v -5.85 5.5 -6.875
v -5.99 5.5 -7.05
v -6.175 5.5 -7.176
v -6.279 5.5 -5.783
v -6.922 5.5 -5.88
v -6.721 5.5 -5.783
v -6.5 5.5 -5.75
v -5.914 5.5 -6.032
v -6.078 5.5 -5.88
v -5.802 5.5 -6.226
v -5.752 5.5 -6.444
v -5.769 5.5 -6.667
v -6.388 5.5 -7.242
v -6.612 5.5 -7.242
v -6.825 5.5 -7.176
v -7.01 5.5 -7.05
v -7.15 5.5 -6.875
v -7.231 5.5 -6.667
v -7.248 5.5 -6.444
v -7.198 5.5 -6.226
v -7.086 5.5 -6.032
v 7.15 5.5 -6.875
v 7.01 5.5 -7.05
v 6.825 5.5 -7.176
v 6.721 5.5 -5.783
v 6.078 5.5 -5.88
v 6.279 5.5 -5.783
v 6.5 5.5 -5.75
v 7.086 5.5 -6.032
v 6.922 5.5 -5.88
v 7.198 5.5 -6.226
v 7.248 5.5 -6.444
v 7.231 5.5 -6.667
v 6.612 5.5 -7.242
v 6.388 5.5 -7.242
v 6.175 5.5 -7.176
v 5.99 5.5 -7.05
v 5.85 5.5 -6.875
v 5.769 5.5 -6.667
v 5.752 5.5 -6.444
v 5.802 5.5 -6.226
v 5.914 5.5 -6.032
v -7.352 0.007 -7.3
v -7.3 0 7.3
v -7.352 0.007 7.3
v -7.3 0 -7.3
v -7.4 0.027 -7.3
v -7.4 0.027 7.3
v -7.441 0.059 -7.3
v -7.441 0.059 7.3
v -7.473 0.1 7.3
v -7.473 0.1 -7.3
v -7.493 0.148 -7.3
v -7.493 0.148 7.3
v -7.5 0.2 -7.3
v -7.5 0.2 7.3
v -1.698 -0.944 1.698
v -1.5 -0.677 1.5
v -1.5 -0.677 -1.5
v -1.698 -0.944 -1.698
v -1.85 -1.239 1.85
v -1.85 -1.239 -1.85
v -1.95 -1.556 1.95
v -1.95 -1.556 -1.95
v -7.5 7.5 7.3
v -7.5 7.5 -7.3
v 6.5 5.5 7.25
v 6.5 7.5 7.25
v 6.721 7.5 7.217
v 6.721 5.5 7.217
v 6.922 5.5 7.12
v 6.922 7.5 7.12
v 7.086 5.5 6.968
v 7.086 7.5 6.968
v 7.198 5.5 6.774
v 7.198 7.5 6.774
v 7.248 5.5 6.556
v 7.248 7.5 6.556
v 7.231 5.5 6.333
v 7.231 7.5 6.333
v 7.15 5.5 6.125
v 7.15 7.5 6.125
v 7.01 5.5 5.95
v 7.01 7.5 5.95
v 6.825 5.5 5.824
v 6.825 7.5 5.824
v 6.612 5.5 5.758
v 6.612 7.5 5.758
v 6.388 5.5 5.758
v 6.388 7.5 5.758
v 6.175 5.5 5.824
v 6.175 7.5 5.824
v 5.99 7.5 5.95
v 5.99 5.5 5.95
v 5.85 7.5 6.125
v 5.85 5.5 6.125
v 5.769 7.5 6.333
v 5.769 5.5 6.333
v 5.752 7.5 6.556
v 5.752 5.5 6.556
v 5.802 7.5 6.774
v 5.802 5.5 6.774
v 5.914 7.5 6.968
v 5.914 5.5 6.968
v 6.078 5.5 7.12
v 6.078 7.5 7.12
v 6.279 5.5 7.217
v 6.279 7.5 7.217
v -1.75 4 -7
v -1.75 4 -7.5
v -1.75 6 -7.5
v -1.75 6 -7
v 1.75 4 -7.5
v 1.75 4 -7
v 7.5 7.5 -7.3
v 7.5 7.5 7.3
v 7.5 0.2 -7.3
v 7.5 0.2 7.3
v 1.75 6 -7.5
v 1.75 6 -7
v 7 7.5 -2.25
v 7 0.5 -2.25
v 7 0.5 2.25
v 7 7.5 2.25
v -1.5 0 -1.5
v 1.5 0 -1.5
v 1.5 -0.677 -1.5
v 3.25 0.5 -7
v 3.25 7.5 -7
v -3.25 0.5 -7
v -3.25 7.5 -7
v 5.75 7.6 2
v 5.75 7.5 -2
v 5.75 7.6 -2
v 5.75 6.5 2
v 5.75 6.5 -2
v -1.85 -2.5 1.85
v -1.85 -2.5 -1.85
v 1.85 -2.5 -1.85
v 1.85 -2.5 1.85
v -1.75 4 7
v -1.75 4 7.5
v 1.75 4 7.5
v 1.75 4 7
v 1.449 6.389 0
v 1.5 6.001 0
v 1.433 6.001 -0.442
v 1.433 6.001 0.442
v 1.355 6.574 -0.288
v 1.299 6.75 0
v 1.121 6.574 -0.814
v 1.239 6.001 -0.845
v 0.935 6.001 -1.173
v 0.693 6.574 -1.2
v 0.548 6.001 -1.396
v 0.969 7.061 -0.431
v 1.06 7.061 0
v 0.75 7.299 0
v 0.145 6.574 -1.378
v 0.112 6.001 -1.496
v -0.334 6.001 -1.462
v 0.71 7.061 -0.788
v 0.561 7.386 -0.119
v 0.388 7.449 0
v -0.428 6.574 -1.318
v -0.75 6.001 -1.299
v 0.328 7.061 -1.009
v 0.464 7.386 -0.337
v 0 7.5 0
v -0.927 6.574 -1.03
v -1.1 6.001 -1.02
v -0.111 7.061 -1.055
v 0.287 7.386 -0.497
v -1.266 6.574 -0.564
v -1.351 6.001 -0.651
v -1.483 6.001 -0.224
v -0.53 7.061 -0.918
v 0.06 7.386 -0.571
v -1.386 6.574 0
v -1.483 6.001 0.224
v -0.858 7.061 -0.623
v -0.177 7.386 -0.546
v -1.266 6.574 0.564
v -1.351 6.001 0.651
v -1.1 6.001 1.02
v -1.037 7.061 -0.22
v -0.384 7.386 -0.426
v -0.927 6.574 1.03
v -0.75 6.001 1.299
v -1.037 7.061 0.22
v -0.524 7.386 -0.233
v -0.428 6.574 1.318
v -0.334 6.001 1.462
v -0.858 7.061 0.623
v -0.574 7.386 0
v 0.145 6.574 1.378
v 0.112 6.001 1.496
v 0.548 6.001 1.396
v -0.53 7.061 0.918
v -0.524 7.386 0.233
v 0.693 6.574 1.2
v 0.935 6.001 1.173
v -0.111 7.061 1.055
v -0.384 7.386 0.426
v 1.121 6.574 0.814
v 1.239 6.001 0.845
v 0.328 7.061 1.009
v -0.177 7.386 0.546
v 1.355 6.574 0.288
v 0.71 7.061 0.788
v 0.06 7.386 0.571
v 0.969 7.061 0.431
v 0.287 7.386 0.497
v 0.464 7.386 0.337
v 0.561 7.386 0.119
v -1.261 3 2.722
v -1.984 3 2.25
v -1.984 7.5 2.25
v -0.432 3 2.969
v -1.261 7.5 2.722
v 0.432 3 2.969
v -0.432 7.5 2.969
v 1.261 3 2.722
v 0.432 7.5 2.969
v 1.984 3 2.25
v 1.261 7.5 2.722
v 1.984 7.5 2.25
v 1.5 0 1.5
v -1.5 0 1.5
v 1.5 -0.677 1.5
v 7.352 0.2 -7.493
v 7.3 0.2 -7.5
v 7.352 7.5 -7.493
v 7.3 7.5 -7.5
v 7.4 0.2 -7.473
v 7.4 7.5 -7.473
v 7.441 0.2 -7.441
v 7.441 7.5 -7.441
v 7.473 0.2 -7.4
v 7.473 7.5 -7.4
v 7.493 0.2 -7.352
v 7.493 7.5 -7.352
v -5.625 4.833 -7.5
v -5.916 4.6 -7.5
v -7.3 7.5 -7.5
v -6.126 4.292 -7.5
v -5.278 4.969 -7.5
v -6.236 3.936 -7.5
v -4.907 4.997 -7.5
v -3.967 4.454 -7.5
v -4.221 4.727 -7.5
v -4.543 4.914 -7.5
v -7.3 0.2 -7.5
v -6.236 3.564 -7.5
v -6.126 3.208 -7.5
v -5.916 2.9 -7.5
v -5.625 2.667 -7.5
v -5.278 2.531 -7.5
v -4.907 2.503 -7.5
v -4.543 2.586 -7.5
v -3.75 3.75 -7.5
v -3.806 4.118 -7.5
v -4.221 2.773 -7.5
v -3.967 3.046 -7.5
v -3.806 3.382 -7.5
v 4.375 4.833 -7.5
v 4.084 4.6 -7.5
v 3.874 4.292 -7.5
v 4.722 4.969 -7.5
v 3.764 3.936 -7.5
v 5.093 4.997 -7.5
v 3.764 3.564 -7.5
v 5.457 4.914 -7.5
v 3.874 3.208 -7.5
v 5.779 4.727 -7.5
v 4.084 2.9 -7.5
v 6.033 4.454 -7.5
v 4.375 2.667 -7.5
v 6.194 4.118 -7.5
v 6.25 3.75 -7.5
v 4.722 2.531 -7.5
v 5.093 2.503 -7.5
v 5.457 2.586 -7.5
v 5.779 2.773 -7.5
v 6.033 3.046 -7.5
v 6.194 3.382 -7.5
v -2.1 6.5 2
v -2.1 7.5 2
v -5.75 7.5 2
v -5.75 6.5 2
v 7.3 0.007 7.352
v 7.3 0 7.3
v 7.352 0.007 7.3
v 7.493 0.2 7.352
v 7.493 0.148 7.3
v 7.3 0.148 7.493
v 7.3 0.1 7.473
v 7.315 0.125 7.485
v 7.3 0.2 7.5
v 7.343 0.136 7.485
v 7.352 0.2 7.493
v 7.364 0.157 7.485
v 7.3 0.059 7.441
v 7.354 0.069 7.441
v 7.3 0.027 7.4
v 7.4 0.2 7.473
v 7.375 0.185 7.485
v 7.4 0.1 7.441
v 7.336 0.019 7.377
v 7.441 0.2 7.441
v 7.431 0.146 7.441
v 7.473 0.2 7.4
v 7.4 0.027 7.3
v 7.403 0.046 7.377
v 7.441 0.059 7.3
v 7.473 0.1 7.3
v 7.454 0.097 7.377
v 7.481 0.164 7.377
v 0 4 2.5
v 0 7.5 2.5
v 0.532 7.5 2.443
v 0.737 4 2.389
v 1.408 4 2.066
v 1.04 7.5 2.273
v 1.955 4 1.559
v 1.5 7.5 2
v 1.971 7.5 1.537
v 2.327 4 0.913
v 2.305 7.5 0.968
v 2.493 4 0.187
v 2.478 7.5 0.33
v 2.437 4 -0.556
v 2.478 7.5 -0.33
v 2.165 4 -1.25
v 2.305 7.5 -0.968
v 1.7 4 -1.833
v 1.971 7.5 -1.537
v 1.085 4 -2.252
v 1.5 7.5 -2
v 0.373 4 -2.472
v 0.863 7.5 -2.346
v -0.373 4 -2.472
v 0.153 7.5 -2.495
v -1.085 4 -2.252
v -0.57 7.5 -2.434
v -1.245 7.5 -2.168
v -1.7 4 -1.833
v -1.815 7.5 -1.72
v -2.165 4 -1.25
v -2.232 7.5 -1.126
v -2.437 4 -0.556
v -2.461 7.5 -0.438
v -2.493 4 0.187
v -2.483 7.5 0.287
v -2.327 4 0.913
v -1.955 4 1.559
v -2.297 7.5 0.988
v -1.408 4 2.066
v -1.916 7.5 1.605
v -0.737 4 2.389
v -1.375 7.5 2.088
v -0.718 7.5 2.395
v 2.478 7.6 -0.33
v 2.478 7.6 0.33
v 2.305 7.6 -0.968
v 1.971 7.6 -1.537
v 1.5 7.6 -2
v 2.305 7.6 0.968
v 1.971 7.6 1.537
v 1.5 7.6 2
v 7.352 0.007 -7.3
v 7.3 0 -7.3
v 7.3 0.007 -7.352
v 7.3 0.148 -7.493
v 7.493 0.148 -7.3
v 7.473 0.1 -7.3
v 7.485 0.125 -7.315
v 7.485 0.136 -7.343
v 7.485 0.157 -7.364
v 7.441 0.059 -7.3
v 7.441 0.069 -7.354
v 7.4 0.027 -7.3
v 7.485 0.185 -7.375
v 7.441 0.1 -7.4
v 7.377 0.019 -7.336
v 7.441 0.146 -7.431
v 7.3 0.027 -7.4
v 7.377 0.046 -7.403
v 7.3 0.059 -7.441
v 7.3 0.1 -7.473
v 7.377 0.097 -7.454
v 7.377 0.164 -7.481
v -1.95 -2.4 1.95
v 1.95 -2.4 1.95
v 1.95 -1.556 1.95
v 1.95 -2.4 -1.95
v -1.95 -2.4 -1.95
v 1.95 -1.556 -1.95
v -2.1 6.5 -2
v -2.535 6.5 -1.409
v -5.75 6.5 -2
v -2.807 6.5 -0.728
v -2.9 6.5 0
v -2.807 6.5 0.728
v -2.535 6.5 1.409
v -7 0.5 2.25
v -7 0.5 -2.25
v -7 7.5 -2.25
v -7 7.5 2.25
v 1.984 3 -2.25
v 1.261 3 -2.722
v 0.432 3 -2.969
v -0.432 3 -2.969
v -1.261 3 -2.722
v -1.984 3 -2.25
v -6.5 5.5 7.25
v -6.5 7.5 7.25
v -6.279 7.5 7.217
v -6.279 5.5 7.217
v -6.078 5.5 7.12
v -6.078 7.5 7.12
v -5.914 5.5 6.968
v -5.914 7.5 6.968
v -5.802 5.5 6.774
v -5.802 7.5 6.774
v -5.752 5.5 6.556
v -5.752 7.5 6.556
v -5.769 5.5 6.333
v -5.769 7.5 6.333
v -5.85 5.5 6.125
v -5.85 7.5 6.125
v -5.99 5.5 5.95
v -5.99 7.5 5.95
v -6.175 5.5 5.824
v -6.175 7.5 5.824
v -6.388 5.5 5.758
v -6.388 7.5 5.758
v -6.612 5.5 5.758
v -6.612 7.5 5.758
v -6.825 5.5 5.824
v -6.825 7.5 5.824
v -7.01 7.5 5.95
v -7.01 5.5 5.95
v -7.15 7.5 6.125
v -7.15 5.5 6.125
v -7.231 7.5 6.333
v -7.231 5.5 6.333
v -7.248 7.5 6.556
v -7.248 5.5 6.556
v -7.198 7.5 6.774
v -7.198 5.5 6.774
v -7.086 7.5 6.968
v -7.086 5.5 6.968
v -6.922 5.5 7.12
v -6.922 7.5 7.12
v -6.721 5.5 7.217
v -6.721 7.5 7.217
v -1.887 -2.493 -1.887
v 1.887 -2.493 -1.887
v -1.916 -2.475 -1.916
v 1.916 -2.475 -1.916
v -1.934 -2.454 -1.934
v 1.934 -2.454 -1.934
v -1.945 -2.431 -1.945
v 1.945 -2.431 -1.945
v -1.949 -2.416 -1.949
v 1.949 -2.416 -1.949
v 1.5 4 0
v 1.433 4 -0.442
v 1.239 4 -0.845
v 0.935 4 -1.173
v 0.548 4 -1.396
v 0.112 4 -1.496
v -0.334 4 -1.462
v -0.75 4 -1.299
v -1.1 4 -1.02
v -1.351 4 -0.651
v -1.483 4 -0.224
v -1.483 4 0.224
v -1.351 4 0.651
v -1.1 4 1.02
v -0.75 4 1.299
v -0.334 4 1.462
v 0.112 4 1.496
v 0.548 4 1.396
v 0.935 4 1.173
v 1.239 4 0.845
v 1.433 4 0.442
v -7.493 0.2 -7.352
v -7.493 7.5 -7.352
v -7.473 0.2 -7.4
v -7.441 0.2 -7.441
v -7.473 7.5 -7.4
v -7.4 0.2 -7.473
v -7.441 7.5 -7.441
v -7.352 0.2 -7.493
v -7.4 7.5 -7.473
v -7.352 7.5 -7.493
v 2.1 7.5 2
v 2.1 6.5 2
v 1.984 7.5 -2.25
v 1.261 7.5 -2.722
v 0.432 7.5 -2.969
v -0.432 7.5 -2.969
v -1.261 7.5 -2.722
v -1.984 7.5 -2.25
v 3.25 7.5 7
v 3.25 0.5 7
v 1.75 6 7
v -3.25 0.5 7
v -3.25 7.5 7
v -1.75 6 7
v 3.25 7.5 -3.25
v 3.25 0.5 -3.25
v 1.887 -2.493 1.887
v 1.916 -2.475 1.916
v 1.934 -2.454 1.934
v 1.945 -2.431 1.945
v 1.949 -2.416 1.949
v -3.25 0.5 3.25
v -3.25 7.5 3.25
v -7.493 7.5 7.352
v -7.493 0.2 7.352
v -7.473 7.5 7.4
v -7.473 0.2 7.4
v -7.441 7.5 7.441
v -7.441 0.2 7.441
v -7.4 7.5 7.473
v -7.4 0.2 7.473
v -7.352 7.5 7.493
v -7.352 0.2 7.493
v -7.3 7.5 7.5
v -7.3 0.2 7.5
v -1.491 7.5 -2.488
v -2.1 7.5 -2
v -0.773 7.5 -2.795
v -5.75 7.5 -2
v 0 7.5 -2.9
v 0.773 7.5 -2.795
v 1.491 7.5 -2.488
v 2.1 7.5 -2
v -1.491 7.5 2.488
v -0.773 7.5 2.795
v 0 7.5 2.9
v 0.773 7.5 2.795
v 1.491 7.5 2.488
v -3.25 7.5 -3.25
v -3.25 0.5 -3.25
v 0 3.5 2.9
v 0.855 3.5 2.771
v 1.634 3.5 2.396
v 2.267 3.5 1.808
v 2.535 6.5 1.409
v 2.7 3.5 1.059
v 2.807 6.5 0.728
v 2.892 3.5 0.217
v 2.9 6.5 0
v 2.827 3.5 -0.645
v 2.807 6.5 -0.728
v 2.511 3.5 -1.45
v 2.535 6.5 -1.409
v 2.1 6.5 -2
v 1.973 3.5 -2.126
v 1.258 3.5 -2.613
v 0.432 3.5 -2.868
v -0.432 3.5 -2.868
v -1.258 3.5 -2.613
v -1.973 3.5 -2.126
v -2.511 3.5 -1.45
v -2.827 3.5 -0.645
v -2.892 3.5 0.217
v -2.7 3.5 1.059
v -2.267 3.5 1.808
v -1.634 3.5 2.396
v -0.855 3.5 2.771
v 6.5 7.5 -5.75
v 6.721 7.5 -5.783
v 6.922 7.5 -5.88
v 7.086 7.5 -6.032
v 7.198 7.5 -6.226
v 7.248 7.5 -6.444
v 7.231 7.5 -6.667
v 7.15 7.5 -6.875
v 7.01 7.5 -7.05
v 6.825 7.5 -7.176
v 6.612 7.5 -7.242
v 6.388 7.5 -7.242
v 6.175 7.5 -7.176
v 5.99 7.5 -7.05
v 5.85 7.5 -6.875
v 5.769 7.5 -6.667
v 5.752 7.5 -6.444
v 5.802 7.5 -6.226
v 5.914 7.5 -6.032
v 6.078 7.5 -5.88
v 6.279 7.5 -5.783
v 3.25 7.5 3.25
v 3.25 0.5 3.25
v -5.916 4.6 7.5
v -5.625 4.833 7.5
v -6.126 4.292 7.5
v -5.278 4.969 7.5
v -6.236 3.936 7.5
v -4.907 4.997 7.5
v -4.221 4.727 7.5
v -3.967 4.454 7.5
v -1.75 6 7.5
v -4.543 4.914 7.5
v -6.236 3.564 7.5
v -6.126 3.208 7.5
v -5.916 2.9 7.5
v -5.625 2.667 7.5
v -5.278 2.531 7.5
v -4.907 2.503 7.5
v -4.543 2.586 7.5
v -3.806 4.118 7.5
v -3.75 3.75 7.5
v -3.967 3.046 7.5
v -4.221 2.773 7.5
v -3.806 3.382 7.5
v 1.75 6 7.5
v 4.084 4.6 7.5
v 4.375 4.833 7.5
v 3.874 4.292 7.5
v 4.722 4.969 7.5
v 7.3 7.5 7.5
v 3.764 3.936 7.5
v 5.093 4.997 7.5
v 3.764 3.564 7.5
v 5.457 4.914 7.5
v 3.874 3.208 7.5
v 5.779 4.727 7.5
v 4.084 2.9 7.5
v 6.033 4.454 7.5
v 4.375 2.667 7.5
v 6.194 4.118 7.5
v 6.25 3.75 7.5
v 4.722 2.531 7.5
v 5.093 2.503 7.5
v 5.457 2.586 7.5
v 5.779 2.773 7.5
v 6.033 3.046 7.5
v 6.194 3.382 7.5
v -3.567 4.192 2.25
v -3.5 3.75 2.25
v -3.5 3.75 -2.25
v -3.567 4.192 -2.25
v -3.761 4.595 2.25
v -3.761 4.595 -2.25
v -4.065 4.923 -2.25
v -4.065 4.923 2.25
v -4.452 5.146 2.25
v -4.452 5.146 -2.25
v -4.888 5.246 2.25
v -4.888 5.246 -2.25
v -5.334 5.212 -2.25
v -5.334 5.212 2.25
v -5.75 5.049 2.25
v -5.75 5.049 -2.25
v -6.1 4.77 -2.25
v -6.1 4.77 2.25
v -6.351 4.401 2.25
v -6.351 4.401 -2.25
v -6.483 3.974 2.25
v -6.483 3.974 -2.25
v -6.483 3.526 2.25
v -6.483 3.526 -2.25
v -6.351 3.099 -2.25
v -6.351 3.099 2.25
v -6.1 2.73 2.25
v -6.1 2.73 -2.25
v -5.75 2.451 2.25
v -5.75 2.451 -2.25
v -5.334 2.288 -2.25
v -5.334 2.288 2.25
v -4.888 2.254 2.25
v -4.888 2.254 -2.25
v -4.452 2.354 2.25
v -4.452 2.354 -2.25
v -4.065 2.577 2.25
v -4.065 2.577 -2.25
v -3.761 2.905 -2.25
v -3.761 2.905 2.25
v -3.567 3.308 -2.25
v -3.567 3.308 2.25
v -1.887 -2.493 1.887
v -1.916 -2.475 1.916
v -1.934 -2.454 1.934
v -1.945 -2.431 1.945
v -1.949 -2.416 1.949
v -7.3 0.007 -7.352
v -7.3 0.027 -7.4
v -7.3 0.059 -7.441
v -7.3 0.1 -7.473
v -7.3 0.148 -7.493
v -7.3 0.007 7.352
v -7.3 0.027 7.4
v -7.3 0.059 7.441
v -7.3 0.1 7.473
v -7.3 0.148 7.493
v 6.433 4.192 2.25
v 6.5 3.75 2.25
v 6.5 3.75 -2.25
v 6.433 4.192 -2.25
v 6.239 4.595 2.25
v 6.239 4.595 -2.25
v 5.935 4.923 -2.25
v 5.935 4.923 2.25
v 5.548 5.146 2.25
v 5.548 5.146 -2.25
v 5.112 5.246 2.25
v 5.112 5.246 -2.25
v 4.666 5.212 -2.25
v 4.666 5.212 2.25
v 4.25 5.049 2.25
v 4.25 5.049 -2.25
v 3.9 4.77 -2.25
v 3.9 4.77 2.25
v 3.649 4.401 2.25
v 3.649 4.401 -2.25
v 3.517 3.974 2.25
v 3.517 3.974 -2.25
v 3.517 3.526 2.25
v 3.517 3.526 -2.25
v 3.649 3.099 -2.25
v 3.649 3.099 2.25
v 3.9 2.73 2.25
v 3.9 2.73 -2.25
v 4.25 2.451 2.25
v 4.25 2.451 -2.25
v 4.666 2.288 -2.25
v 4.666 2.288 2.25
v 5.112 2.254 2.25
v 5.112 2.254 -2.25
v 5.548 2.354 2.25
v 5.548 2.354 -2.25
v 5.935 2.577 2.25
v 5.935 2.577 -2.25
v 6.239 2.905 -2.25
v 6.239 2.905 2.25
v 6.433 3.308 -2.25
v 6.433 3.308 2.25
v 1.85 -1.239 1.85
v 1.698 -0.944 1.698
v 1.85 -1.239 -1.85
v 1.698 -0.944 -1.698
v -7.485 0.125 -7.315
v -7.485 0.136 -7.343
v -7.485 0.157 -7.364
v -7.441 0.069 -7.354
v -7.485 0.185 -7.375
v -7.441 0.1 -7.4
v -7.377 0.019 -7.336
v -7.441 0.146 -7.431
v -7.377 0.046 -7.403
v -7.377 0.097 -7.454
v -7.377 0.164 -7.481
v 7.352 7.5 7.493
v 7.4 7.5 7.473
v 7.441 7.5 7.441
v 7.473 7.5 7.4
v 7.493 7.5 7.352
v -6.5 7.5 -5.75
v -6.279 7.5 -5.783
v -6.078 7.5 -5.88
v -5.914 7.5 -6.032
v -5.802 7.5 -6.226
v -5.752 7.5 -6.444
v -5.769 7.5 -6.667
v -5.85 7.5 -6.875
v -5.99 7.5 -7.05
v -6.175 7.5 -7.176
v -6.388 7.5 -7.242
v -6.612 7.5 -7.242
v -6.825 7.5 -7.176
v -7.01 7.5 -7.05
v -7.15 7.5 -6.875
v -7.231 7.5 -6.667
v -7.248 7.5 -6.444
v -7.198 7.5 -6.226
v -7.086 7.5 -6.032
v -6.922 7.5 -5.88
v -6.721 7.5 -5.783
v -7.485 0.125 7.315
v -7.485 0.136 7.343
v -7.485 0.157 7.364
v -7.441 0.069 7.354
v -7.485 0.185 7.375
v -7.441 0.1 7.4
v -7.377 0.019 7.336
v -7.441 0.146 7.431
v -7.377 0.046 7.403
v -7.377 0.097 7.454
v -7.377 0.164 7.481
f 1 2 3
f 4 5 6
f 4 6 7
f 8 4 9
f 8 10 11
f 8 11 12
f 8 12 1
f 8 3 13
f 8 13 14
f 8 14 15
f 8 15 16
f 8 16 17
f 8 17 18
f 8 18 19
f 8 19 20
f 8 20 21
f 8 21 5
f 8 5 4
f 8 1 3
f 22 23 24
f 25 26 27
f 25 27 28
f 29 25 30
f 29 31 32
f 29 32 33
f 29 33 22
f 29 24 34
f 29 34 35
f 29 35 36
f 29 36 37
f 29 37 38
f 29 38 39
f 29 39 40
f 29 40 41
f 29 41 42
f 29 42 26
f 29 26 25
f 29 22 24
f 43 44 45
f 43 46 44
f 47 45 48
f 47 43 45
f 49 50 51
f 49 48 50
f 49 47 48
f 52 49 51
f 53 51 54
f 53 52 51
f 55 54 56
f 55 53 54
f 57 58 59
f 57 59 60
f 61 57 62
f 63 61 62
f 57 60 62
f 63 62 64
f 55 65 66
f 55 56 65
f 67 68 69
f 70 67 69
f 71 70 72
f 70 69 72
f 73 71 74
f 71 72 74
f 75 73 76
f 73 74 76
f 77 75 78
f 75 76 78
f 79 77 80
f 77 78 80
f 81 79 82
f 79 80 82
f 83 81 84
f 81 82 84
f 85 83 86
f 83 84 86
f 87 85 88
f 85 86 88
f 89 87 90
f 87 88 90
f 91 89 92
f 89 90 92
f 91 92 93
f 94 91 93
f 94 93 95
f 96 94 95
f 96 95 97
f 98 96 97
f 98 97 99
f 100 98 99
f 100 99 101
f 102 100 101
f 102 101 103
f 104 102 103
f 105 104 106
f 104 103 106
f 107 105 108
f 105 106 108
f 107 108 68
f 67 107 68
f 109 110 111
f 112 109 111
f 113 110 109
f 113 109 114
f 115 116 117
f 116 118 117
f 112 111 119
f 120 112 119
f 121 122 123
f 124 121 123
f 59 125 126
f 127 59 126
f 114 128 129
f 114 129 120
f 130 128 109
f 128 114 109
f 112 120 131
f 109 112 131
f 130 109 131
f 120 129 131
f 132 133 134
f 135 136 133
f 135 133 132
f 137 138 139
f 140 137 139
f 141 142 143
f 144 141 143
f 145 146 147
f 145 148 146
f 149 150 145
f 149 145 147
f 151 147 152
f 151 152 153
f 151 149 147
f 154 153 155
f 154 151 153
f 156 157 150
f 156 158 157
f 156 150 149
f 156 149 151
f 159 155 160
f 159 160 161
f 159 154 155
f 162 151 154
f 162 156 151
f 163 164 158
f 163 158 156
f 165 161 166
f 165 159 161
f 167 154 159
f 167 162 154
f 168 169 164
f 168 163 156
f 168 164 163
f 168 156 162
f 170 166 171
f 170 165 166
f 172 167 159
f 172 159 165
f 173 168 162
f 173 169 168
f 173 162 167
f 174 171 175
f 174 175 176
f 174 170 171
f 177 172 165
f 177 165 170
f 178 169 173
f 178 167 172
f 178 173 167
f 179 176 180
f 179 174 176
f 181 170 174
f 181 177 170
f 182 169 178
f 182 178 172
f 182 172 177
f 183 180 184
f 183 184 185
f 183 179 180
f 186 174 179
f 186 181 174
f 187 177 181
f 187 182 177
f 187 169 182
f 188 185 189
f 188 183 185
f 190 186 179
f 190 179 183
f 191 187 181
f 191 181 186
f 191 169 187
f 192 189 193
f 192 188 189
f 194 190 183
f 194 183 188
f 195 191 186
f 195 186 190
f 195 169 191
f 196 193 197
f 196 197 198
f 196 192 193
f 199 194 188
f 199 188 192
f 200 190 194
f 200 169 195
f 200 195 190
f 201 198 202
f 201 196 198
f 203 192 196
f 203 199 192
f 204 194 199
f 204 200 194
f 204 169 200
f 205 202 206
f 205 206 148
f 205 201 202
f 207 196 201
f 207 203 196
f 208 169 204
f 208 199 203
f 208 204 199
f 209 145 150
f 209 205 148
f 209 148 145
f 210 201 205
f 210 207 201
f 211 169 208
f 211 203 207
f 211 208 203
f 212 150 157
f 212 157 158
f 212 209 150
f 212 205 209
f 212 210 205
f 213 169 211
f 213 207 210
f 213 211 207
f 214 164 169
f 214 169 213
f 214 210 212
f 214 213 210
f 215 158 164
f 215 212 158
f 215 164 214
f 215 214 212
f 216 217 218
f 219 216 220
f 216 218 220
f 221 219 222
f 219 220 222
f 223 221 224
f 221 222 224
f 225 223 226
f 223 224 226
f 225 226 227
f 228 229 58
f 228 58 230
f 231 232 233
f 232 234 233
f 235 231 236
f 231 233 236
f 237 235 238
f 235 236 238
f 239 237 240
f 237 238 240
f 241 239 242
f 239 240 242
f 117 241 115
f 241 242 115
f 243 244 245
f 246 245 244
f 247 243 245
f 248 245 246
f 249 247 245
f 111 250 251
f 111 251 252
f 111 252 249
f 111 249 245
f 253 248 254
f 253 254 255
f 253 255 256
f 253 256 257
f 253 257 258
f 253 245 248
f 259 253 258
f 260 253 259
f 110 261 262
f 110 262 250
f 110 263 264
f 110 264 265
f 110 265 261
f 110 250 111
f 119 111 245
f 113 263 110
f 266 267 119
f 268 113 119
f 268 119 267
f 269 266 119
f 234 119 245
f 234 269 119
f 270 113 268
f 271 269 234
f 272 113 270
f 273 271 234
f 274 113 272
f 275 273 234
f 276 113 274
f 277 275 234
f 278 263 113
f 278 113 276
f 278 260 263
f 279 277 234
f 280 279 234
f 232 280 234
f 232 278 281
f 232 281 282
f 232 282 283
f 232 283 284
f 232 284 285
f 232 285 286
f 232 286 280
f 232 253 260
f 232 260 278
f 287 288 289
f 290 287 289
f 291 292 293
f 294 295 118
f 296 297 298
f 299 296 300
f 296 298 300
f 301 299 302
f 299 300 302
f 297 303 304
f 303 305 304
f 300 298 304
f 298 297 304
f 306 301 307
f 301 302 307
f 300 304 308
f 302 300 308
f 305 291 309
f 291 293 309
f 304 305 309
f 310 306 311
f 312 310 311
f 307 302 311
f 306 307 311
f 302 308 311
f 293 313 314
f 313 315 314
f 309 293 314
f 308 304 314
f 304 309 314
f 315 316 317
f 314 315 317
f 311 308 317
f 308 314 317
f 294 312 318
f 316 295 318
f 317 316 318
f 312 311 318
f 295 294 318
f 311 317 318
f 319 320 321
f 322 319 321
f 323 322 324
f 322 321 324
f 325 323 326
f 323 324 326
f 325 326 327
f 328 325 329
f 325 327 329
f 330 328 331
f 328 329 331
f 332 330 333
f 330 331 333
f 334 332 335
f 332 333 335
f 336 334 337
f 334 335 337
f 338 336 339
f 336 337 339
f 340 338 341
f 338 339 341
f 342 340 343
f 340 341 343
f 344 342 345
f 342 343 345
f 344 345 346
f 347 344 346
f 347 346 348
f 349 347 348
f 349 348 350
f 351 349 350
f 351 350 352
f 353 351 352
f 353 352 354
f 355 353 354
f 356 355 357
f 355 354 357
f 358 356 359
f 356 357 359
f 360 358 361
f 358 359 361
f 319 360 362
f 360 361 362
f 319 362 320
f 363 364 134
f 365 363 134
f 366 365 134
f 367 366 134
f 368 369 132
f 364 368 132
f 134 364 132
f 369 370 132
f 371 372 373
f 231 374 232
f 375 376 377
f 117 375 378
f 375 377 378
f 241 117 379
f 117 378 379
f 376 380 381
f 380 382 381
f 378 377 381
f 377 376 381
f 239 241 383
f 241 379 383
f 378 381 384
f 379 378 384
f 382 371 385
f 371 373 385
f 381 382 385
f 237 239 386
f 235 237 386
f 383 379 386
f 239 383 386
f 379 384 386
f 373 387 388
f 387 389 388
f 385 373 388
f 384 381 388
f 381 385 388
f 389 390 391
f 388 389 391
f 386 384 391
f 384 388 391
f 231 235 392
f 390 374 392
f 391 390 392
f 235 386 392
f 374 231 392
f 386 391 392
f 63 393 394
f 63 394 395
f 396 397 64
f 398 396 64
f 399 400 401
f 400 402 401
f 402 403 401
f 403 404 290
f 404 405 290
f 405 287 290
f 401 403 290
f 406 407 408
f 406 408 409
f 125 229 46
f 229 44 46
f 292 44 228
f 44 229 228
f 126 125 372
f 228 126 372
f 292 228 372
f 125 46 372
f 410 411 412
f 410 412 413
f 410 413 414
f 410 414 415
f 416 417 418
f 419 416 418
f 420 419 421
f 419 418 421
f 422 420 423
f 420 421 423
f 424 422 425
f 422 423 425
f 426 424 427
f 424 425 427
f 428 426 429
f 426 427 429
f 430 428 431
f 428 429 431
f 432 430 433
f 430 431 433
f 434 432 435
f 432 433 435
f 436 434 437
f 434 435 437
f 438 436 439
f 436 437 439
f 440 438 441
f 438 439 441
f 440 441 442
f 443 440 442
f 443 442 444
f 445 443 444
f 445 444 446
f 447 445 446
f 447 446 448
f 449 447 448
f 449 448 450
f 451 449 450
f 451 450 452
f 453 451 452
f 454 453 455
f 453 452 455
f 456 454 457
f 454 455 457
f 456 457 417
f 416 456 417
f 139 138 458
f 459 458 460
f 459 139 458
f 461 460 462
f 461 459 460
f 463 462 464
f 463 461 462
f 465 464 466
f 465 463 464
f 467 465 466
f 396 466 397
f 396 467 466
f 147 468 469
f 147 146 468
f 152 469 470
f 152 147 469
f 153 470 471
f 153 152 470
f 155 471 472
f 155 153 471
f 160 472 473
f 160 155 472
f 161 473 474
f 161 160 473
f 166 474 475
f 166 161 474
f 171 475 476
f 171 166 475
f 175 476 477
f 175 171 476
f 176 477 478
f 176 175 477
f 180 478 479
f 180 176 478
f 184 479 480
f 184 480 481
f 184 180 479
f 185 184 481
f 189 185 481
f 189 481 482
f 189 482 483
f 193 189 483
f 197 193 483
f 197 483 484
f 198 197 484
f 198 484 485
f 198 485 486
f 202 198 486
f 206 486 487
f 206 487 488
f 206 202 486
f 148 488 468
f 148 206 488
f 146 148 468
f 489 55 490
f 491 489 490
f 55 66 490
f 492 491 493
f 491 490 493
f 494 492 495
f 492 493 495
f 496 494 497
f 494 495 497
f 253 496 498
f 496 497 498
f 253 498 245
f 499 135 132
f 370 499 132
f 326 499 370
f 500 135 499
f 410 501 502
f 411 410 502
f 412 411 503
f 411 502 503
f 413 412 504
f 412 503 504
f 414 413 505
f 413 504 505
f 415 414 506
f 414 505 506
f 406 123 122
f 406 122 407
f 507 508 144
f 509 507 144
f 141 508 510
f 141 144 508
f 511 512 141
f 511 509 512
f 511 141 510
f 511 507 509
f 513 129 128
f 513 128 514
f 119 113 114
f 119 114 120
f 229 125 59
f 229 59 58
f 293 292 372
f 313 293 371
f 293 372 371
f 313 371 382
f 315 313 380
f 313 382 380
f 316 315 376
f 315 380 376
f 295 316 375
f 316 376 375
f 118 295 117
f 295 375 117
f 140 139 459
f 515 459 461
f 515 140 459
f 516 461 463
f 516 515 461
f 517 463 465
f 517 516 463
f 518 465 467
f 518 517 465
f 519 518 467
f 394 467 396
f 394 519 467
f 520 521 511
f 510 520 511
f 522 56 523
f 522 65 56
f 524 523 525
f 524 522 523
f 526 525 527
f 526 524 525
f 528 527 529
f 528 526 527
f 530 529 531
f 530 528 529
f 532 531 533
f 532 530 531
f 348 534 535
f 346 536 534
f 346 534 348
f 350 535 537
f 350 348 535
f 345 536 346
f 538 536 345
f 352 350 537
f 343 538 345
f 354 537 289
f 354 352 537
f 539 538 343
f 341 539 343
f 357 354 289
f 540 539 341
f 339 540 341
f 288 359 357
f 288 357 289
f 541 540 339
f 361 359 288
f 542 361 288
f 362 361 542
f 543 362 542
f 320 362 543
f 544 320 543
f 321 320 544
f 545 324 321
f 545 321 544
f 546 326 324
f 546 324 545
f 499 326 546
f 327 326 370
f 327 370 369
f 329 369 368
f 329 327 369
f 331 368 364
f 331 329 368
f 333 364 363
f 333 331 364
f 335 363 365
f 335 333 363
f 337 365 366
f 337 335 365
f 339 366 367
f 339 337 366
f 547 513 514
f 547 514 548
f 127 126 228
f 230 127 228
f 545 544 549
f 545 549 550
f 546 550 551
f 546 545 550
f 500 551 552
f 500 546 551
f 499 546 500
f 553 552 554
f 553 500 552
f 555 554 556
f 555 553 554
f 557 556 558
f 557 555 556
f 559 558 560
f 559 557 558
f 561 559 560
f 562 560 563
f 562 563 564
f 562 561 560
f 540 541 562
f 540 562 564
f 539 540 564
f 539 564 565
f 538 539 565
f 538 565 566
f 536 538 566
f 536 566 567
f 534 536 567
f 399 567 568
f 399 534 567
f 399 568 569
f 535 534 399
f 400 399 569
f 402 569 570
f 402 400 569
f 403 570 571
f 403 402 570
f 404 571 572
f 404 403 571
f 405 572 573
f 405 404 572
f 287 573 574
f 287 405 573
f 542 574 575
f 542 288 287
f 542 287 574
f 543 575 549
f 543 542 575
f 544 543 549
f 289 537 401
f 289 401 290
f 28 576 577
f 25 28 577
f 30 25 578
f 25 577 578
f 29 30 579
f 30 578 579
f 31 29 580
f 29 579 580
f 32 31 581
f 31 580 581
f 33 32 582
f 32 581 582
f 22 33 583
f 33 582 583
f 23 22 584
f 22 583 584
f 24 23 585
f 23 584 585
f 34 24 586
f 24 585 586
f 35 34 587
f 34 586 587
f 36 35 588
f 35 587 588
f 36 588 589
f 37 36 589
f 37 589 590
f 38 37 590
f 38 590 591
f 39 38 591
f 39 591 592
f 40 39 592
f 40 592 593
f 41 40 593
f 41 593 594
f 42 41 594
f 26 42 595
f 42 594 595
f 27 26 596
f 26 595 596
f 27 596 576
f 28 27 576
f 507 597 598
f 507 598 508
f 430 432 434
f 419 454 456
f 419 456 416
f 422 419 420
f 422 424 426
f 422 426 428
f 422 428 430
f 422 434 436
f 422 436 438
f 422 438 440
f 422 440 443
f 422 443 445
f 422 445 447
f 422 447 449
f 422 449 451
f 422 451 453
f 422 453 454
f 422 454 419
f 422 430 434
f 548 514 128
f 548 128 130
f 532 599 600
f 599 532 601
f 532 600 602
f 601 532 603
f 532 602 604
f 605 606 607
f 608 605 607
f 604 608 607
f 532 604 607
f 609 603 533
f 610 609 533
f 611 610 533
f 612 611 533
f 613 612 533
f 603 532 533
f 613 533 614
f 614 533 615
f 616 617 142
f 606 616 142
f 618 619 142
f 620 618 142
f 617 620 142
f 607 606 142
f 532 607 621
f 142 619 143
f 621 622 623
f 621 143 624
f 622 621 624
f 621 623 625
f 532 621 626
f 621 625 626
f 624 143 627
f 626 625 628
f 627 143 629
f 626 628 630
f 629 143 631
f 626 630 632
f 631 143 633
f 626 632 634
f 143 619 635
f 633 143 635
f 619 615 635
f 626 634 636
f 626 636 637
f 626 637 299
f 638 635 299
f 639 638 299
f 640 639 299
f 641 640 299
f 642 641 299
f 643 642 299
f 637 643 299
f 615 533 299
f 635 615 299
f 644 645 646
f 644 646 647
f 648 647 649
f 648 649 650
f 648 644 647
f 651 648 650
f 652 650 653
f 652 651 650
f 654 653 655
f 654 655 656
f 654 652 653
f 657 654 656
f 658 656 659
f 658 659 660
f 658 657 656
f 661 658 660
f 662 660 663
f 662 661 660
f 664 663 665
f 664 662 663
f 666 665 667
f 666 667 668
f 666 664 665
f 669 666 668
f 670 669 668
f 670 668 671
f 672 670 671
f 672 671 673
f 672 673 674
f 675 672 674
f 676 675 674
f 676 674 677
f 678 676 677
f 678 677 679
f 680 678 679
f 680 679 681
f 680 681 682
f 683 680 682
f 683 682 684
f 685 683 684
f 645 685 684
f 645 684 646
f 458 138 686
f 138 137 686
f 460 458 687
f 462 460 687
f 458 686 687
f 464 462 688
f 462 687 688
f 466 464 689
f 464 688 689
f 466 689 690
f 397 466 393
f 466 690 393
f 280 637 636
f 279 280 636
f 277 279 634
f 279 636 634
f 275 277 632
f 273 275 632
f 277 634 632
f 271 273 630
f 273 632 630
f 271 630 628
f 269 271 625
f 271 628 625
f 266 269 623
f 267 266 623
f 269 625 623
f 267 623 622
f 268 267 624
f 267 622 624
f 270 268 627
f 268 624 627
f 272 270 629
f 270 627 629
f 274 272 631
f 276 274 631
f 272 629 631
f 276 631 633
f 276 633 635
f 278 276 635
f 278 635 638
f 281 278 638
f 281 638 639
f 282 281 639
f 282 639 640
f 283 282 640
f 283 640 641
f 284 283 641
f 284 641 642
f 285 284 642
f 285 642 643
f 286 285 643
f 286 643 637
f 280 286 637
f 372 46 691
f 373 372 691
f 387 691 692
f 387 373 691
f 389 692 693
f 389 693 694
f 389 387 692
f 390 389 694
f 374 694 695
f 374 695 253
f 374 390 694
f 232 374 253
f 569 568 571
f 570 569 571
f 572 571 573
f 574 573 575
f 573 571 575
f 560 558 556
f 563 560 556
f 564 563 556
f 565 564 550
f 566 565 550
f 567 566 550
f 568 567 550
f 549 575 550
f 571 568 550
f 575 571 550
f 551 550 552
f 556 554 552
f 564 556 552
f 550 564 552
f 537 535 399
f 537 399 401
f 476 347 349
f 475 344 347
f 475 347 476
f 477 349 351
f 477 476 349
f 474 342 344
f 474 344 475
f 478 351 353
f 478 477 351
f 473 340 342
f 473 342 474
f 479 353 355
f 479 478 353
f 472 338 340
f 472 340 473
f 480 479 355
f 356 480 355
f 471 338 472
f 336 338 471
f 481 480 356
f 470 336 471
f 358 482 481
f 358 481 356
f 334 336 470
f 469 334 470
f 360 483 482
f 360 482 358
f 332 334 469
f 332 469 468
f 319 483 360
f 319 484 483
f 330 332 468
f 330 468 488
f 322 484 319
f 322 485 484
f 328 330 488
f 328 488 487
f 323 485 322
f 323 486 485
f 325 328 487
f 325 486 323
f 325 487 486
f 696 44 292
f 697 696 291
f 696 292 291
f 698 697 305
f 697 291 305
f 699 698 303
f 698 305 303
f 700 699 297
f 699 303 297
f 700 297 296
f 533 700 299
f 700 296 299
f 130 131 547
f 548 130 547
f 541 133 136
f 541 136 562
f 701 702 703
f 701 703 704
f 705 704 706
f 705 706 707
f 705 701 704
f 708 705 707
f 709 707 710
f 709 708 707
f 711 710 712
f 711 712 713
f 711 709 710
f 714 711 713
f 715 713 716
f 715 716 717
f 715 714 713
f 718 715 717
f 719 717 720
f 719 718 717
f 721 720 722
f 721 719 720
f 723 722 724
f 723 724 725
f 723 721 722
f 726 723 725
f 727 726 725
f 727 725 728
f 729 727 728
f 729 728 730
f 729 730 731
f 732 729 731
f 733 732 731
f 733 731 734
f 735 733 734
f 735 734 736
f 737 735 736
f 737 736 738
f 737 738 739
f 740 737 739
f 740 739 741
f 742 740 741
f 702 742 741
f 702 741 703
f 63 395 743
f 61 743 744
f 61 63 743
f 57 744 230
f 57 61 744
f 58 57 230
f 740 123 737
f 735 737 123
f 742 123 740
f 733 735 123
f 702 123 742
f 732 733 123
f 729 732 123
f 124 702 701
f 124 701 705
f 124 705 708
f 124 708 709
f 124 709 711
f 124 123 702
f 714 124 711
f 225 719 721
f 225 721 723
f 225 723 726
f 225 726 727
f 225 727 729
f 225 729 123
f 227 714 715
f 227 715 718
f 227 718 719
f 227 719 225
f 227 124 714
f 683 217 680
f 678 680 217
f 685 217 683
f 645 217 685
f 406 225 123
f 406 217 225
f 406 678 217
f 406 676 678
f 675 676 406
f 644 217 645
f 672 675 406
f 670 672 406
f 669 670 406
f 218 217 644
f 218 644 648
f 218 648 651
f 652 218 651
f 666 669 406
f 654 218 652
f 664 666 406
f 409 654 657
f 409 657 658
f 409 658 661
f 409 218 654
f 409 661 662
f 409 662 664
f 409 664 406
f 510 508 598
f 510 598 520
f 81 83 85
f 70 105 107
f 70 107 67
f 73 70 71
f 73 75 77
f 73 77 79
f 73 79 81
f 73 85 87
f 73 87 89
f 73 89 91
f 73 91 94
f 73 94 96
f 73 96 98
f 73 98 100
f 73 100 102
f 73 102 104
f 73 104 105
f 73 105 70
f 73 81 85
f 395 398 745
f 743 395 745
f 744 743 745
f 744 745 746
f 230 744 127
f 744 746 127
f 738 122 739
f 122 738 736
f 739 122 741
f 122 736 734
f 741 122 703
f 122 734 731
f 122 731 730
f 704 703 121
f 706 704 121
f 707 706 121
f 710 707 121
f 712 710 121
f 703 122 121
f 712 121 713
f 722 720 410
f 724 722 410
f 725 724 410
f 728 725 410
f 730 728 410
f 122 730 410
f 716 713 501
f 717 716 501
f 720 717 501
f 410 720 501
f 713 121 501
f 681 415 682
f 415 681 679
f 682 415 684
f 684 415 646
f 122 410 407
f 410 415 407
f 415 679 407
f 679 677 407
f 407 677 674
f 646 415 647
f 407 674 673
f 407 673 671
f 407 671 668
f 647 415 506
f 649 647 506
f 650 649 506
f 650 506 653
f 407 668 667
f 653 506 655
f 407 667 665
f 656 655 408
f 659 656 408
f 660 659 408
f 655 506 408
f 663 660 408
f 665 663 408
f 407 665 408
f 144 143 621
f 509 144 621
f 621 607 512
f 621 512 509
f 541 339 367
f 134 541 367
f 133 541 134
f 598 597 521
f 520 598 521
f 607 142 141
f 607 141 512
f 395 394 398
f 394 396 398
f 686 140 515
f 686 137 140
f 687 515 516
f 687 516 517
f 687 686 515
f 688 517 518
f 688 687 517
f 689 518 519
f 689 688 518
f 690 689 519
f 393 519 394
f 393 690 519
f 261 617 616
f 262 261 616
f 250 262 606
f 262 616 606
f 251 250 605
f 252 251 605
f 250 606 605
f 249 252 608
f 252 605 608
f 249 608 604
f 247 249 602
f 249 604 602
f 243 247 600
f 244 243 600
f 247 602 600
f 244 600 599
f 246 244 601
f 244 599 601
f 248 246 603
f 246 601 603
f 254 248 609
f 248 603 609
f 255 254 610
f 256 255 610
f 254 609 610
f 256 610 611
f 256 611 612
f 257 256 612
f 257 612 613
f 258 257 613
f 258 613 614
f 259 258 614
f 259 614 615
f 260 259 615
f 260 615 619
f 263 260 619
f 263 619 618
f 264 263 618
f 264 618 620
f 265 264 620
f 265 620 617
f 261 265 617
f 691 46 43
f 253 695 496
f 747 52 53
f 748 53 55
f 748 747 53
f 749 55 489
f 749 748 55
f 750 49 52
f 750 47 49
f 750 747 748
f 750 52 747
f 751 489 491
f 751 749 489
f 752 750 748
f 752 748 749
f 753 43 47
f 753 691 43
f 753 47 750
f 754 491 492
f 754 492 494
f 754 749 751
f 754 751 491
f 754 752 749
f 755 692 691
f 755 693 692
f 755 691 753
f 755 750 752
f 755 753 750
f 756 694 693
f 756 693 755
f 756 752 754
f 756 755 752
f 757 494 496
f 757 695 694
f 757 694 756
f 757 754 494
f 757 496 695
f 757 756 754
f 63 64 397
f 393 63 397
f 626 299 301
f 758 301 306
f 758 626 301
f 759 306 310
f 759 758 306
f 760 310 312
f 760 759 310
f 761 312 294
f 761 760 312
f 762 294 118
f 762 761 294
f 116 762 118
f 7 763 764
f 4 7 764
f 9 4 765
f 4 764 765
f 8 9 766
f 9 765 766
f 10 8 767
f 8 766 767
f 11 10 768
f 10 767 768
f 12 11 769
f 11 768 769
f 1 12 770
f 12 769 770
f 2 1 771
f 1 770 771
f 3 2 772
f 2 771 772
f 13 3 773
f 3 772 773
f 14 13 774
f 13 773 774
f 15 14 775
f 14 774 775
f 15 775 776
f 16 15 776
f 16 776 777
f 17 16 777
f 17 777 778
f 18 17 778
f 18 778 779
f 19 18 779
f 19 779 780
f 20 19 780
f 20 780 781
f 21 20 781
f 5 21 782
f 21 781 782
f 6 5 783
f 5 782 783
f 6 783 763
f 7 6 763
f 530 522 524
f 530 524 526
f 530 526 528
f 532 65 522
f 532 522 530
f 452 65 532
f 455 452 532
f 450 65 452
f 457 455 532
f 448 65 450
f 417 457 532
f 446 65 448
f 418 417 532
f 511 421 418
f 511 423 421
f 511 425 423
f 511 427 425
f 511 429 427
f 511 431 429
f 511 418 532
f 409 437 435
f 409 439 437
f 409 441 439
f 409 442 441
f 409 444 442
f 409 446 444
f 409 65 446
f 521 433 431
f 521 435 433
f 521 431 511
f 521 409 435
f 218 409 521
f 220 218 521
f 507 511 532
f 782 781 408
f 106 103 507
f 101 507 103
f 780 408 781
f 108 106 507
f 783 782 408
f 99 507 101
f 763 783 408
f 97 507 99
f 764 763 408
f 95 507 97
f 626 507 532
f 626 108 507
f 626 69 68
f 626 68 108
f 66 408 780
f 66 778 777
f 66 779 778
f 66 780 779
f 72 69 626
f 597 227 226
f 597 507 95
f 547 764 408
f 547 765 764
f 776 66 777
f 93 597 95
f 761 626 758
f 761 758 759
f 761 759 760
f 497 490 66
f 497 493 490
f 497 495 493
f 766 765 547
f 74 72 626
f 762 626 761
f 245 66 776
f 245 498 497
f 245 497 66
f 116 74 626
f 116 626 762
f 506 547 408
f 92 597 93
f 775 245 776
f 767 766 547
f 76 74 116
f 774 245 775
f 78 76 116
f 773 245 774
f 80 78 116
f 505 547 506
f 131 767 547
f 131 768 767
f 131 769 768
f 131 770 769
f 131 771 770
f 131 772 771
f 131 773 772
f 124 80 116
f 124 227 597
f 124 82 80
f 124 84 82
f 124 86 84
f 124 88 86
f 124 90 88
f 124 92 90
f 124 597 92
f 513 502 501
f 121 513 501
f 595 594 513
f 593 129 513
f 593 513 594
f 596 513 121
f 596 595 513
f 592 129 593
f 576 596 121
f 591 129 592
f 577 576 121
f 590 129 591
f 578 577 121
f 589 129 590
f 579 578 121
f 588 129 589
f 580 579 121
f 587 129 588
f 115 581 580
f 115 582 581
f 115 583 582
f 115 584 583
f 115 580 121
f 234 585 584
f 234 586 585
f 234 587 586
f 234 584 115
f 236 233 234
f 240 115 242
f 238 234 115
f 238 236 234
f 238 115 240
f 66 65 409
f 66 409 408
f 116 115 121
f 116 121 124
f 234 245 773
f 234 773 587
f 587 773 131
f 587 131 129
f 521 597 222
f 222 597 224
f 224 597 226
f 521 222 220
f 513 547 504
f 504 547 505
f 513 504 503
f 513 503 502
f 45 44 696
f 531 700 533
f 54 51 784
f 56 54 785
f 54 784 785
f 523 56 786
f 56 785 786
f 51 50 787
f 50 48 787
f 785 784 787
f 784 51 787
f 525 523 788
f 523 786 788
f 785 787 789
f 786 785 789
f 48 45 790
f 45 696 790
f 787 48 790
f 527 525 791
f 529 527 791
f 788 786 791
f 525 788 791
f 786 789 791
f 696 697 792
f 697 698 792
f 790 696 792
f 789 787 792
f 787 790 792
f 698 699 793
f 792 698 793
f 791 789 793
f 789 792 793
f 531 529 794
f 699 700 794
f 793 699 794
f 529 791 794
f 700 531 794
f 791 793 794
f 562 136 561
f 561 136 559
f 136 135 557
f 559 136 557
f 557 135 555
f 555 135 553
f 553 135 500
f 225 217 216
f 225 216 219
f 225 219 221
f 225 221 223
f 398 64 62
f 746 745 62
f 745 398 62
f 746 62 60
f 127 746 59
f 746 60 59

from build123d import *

# Parameters (mm, degrees)
SKETCH_2_W                      = 15
SKETCH_2_H                      = 15
EXTRUDE_1_DEPTH                 = 7.5
SKETCH_3_W                      = 14
SKETCH_3_H                      = 4.5
CUT_EXTRUDE_1_DEPTH             = 7
SKETCH_4_R                      = 3
CUT_EXTRUDE_2_DEPTH             = 4.5
SKETCH_5_W                      = 6.5
SKETCH_5_H                      = 3.75
CUT_EXTRUDE_3_DEPTH             = 7
EXTRUDE_2_REACH                 = 20.371
SKETCH_6_R                      = 1.5
SKETCH_7_R                      = 1.25
CUT_EXTRUDE_4_DEPTH             = 19.371173071
SKETCH_8_W                      = 3
SKETCH_8_H                      = 3
EXTRUDE_3_DEPTH                 = 1
CUT_EXTRUDE_5_REACH             = 20.371
SKETCH_9_W                      = 3.5
SKETCH_9_H                      = 2
CUT_EXTRUDE_6_REACH             = 35.371
CUT_EXTRUDE_START               = -15
SKETCH_9_2_W                    = 3.5
SKETCH_9_2_H                    = 2
EXTRUDE_4_DEPTH                 = 2
EXTRUDE_4_DEPTH_BACK            = 2
CUT_EXTRUDE_7_REACH             = 14.99
CUT_EXTRUDE_7_DIRECTION_2_REACH = 14.99
FILLET_1_R                      = 0.1
FILLET_2_R                      = 0.2
SKETCH_12_R                     = 0.75
CUT_EXTRUDE_8_DEPTH             = 2
SKETCH_13_W                     = 11.5
SKETCH_13_H                     = 4
EXTRUDE_5_DEPTH                 = 1
SKETCH_14_R                     = 2.9
EXTRUDE_6_DEPTH                 = 4
SKETCH_15_R                     = 2.5
CUT_EXTRUDE_9_DEPTH             = 3.5
EXTRUDE_7_DEPTH                 = 0.1


with BuildPart() as part:
    # 草图2 → 凸台-拉伸1 (new body)
    with BuildSketch(Plane(origin=(0, 0, 0), x_dir=(1, 0, 0), z_dir=(0, 1, 0))):
        Rectangle(SKETCH_2_W, SKETCH_2_H)
    extrude(amount=EXTRUDE_1_DEPTH)

    # 草图3 → 切除-拉伸1 (cut)
    with BuildSketch(Plane(origin=(0, 7.5, 0), x_dir=(-1, 0, 0), z_dir=(0, 1, 0))):
        Rectangle(SKETCH_3_W, SKETCH_3_H)
    extrude(amount=-CUT_EXTRUDE_1_DEPTH, mode=Mode.SUBTRACT)

    # 草图4 → 切除-拉伸2 (cut)
    with BuildSketch(Plane(origin=(0, 7.5, 0), x_dir=(1, 0, 0), z_dir=(0, 1, 0))):
        Circle(SKETCH_4_R)
    extrude(amount=-CUT_EXTRUDE_2_DEPTH, mode=Mode.SUBTRACT)

    # 草图5 → 切除-拉伸3 (cut)
    with BuildSketch(Plane(origin=(0, 7.5, 0), x_dir=(-1, 0, 0), z_dir=(0, 1, 0))):
        with Locations((0, -5.125)):
            Rectangle(SKETCH_5_W, SKETCH_5_H)
        with Locations((0, 5.125)):
            Rectangle(SKETCH_5_W, SKETCH_5_H)
    extrude(amount=-CUT_EXTRUDE_3_DEPTH, mode=Mode.SUBTRACT)

    # 草图6 → 凸台-拉伸2 (add, up to next)
    with BuildSketch(Plane.XY.offset(7.5), mode=Mode.PRIVATE) as extrude_2_sk1:
        with Locations((-5, 3.75)):
            Circle(SKETCH_6_R)
    extrude_2_tool1 = extrude(extrude_2_sk1.sketch, amount=-EXTRUDE_2_REACH, mode=Mode.PRIVATE) - part.part
    # 草图6 → 凸台-拉伸2 (add, up to next)
    with BuildSketch(Plane.XY.offset(7.5), mode=Mode.PRIVATE) as extrude_2_sk2:
        with Locations((5, 3.75)):
            Circle(SKETCH_6_R)
    extrude_2_tool2 = extrude(extrude_2_sk2.sketch, amount=-EXTRUDE_2_REACH, mode=Mode.PRIVATE) - part.part
    add(extrude_2_tool1.solids().sort_by_distance((-5, 3.75, 7.5))[0])
    add(extrude_2_tool2.solids().sort_by_distance((5, 3.75, 7.5))[0])

    # 草图7 → 切除-拉伸4 (cut, through all)
    with BuildSketch(Plane.XY.offset(7.5)):
        with Locations((-5, 3.75)):
            Circle(SKETCH_7_R)
        with Locations((5, 3.75)):
            Circle(SKETCH_7_R)
    extrude(amount=-CUT_EXTRUDE_4_DEPTH, mode=Mode.SUBTRACT)

    # 草图8 → 凸台-拉伸3 (add)
    with BuildSketch(Plane.XZ):
        Rectangle(SKETCH_8_W, SKETCH_8_H)
    extrude(amount=EXTRUDE_3_DEPTH)

    # 草图9 → 切除-拉伸5 (cut, up to next)
    with BuildSketch(Plane.XY.offset(7.5), mode=Mode.PRIVATE) as cut_extrude_5_sk1:
        with Locations((0, 5)):
            Rectangle(SKETCH_9_W, SKETCH_9_H)
    cut_extrude_5_tool1 = extrude(cut_extrude_5_sk1.sketch, amount=-CUT_EXTRUDE_5_REACH, mode=Mode.PRIVATE) & part.part
    add(cut_extrude_5_tool1.solids().sort_by_distance((0, 5, 7.5))[0], mode=Mode.SUBTRACT)

    # 草图9<2> → 切除-拉伸6 (cut, up to next)
    with BuildSketch(Plane.XY.offset(7.5).offset(CUT_EXTRUDE_START), mode=Mode.PRIVATE) as cut_extrude_6_sk1:
        with Locations((0, 5)):
            Rectangle(SKETCH_9_2_W, SKETCH_9_2_H)
    cut_extrude_6_tool1 = extrude(cut_extrude_6_sk1.sketch, amount=CUT_EXTRUDE_6_REACH, mode=Mode.PRIVATE) & part.part
    add(cut_extrude_6_tool1.solids().sort_by_distance((0, 5, -7.5))[0], mode=Mode.SUBTRACT)

    # 草图10 → 凸台-拉伸4 (add, two sides: drawn at the far end of the back side and taken through both)
    with BuildSketch(Plane.XY.offset(-EXTRUDE_4_DEPTH_BACK)):
        with BuildLine():
            Line((-1.95, -2.5), (1.95, -2.5))
            Line((1.95, -2.5), (1.95, -1.555590279))
            ThreePointArc((1.95, -1.555590279), (1.780042303, -1.088161527), (1.5, -0.677124344))
            Line((1.5, -0.677124344), (-1.5, -0.677124344))
            ThreePointArc((-1.5, -0.677124344), (-1.780042303, -1.088161527), (-1.95, -1.555590279))
            Line((-1.95, -1.555590279), (-1.95, -2.5))
        make_face()
    extrude(amount=EXTRUDE_4_DEPTH + EXTRUDE_4_DEPTH_BACK)

    # 草图11 → 切除-拉伸7 (cut, up to next)
    with BuildSketch(Plane(origin=(0, 0, 0), x_dir=(0, 0, -1), z_dir=(1, 0, 0)), mode=Mode.PRIVATE) as cut_extrude_7_sk1:
        with BuildLine():
            Line((1.95, -2.5), (1.95, -1.555590279))
            ThreePointArc((1.95, -1.555590279), (1.780042303, -1.088161527), (1.5, -0.677124344))
            Line((1.5, -0.677124344), (2, -0.677124344))
            Line((2, -0.677124344), (2, -2.5))
            Line((2, -2.5), (1.95, -2.5))
        make_face()
    cut_extrude_7_tool1 = extrude(cut_extrude_7_sk1.sketch, amount=-CUT_EXTRUDE_7_REACH, mode=Mode.PRIVATE) & part.part
    # 草图11 → 切除-拉伸7 (cut, up to next)
    with BuildSketch(Plane(origin=(0, 0, 0), x_dir=(0, 0, -1), z_dir=(1, 0, 0)), mode=Mode.PRIVATE) as cut_extrude_7_sk2:
        with BuildLine():
            Line((-1.95, -2.5), (-1.95, -1.555590279))
            ThreePointArc((-1.95, -1.555590279), (-1.780042303, -1.088161527), (-1.5, -0.677124344))
            Line((-1.5, -0.677124344), (-2, -0.677124344))
            Line((-2, -0.677124344), (-2, -2.5))
            Line((-2, -2.5), (-1.95, -2.5))
        make_face()
    cut_extrude_7_tool2 = extrude(cut_extrude_7_sk2.sketch, amount=-CUT_EXTRUDE_7_REACH, mode=Mode.PRIVATE) & part.part
    add(cut_extrude_7_tool1.solids().sort_by_distance((0, -1.175075, -1.873038))[0], mode=Mode.SUBTRACT)
    add(cut_extrude_7_tool2.solids().sort_by_distance((0, -1.175075, 1.873038))[0], mode=Mode.SUBTRACT)

    # 草图11 → 切除-拉伸7 direction 2 (cut, up to next)
    with BuildSketch(Plane(origin=(0, 0, 0), x_dir=(0, 0, -1), z_dir=(1, 0, 0)), mode=Mode.PRIVATE) as cut_extrude_7_direction_2_sk1:
        with BuildLine():
            Line((1.95, -2.5), (1.95, -1.555590279))
            ThreePointArc((1.95, -1.555590279), (1.780042303, -1.088161527), (1.5, -0.677124344))
            Line((1.5, -0.677124344), (2, -0.677124344))
            Line((2, -0.677124344), (2, -2.5))
            Line((2, -2.5), (1.95, -2.5))
        make_face()
    cut_extrude_7_direction_2_tool1 = extrude(cut_extrude_7_direction_2_sk1.sketch, amount=CUT_EXTRUDE_7_DIRECTION_2_REACH, mode=Mode.PRIVATE) & part.part
    # 草图11 → 切除-拉伸7 direction 2 (cut, up to next)
    with BuildSketch(Plane(origin=(0, 0, 0), x_dir=(0, 0, -1), z_dir=(1, 0, 0)), mode=Mode.PRIVATE) as cut_extrude_7_direction_2_sk2:
        with BuildLine():
            Line((-1.95, -2.5), (-1.95, -1.555590279))
            ThreePointArc((-1.95, -1.555590279), (-1.780042303, -1.088161527), (-1.5, -0.677124344))
            Line((-1.5, -0.677124344), (-2, -0.677124344))
            Line((-2, -0.677124344), (-2, -2.5))
            Line((-2, -2.5), (-1.95, -2.5))
        make_face()
    cut_extrude_7_direction_2_tool2 = extrude(cut_extrude_7_direction_2_sk2.sketch, amount=CUT_EXTRUDE_7_DIRECTION_2_REACH, mode=Mode.PRIVATE) & part.part
    add(cut_extrude_7_direction_2_tool1.solids().sort_by_distance((0, -1.175075, -1.873038))[0], mode=Mode.SUBTRACT)
    add(cut_extrude_7_direction_2_tool2.solids().sort_by_distance((0, -1.175075, 1.873038))[0], mode=Mode.SUBTRACT)

    # 圆角1
    fillet_1_edges = [part.edges().sort_by_distance(p)[0] for p in [
        (-1.95, -2.5, 0),
        (1.95, -2.5, 0),
        (0, -2.5, -1.95),
        (0, -2.5, 1.95),
    ]]
    fillet(fillet_1_edges, radius=FILLET_1_R)

    # 圆角2
    fillet_2_edges = [part.edges().sort_by_distance(p)[0] for p in [
        (0, 0, -7.5),
        (7.5, 0, 0),
        (0, 0, 7.5),
        (-7.5, 0, 0),
        (-7.5, 3.75, -7.5),
        (7.5, 3.75, -7.5),
        (7.5, 3.75, 7.5),
        (-7.5, 3.75, 7.5),
    ]]
    fillet(fillet_2_edges, radius=FILLET_2_R)

    # 草图12 → 切除-拉伸8 (cut)
    with BuildSketch(Plane(origin=(0, 7.5, 0), x_dir=(-1, 0, 0), z_dir=(0, 1, 0))):
        with Locations(Location((6.5, -6.5, 0), (0, 0, 90))):
            Circle(SKETCH_12_R)
        with Locations(Location((-6.5, 6.5, 0), (0, 0, 90))):
            Circle(SKETCH_12_R)
        with Locations(Location((6.5, 6.5, 0), (0, 0, 90))):
            Circle(SKETCH_12_R)
        with Locations(Location((-6.5, -6.5, 0), (0, 0, 90))):
            Circle(SKETCH_12_R)
    extrude(amount=-CUT_EXTRUDE_8_DEPTH, mode=Mode.SUBTRACT)


with BuildPart() as body_2:
    # 草图13 → 凸台-拉伸5 (new body)
    with BuildSketch(Plane(origin=(0, 7.5, 0), x_dir=(-1, 0, 0), z_dir=(0, 1, 0))):
        Rectangle(SKETCH_13_W, SKETCH_13_H)
    extrude(amount=-EXTRUDE_5_DEPTH)

    # 草图14 → 凸台-拉伸6 (add)
    with BuildSketch(Plane(origin=(0, 7.5, 0), x_dir=(-1, 0, 0), z_dir=(0, 1, 0))):
        with Locations(Location((0, 0, 0), (0, 0, 90))):
            Circle(SKETCH_14_R)
    extrude(amount=-EXTRUDE_6_DEPTH)

    # 草图15 → 切除-拉伸9 (cut)
    with BuildSketch(Plane(origin=(0, 7.5, 0), x_dir=(-1, 0, 0), z_dir=(0, 1, 0))):
        with Locations(Location((0, 0, 0), (0, 0, 90))):
            Circle(SKETCH_15_R)
    extrude(amount=-CUT_EXTRUDE_9_DEPTH, mode=Mode.SUBTRACT)

    # 草图16 → 旋转2 (revolve)
    with BuildSketch(Plane.XY):
        with BuildLine():
            Line((1.5, 4), (1.5, 6.000567678))
            ThreePointArc((1.5, 6.000567678), (1.060660172, 7.060660172), (0, 7.5))
            Line((0, 7.5), (0, 4))
            Line((0, 4), (1.5, 4))
        make_face()
    revolve(axis=Axis((0, -0.447775082, 0), (0, 1, 0)))

    # 草图17 → 凸台-拉伸7 (add)
    with BuildSketch(Plane(origin=(0, 7.5, 0), x_dir=(-1, 0, 0), z_dir=(0, 1, 0))):
        with BuildLine():
            Line((-5.75, 2), (-1.5, 2))
            ThreePointArc((-1.5, 2), (-2.5, 0), (-1.5, -2))
            Line((-1.5, -2), (-5.75, -2))
            Line((-5.75, -2), (-5.75, 2))
        make_face()
    extrude(amount=EXTRUDE_7_DEPTH)


solid = Compound([part.part, body_2.part])
